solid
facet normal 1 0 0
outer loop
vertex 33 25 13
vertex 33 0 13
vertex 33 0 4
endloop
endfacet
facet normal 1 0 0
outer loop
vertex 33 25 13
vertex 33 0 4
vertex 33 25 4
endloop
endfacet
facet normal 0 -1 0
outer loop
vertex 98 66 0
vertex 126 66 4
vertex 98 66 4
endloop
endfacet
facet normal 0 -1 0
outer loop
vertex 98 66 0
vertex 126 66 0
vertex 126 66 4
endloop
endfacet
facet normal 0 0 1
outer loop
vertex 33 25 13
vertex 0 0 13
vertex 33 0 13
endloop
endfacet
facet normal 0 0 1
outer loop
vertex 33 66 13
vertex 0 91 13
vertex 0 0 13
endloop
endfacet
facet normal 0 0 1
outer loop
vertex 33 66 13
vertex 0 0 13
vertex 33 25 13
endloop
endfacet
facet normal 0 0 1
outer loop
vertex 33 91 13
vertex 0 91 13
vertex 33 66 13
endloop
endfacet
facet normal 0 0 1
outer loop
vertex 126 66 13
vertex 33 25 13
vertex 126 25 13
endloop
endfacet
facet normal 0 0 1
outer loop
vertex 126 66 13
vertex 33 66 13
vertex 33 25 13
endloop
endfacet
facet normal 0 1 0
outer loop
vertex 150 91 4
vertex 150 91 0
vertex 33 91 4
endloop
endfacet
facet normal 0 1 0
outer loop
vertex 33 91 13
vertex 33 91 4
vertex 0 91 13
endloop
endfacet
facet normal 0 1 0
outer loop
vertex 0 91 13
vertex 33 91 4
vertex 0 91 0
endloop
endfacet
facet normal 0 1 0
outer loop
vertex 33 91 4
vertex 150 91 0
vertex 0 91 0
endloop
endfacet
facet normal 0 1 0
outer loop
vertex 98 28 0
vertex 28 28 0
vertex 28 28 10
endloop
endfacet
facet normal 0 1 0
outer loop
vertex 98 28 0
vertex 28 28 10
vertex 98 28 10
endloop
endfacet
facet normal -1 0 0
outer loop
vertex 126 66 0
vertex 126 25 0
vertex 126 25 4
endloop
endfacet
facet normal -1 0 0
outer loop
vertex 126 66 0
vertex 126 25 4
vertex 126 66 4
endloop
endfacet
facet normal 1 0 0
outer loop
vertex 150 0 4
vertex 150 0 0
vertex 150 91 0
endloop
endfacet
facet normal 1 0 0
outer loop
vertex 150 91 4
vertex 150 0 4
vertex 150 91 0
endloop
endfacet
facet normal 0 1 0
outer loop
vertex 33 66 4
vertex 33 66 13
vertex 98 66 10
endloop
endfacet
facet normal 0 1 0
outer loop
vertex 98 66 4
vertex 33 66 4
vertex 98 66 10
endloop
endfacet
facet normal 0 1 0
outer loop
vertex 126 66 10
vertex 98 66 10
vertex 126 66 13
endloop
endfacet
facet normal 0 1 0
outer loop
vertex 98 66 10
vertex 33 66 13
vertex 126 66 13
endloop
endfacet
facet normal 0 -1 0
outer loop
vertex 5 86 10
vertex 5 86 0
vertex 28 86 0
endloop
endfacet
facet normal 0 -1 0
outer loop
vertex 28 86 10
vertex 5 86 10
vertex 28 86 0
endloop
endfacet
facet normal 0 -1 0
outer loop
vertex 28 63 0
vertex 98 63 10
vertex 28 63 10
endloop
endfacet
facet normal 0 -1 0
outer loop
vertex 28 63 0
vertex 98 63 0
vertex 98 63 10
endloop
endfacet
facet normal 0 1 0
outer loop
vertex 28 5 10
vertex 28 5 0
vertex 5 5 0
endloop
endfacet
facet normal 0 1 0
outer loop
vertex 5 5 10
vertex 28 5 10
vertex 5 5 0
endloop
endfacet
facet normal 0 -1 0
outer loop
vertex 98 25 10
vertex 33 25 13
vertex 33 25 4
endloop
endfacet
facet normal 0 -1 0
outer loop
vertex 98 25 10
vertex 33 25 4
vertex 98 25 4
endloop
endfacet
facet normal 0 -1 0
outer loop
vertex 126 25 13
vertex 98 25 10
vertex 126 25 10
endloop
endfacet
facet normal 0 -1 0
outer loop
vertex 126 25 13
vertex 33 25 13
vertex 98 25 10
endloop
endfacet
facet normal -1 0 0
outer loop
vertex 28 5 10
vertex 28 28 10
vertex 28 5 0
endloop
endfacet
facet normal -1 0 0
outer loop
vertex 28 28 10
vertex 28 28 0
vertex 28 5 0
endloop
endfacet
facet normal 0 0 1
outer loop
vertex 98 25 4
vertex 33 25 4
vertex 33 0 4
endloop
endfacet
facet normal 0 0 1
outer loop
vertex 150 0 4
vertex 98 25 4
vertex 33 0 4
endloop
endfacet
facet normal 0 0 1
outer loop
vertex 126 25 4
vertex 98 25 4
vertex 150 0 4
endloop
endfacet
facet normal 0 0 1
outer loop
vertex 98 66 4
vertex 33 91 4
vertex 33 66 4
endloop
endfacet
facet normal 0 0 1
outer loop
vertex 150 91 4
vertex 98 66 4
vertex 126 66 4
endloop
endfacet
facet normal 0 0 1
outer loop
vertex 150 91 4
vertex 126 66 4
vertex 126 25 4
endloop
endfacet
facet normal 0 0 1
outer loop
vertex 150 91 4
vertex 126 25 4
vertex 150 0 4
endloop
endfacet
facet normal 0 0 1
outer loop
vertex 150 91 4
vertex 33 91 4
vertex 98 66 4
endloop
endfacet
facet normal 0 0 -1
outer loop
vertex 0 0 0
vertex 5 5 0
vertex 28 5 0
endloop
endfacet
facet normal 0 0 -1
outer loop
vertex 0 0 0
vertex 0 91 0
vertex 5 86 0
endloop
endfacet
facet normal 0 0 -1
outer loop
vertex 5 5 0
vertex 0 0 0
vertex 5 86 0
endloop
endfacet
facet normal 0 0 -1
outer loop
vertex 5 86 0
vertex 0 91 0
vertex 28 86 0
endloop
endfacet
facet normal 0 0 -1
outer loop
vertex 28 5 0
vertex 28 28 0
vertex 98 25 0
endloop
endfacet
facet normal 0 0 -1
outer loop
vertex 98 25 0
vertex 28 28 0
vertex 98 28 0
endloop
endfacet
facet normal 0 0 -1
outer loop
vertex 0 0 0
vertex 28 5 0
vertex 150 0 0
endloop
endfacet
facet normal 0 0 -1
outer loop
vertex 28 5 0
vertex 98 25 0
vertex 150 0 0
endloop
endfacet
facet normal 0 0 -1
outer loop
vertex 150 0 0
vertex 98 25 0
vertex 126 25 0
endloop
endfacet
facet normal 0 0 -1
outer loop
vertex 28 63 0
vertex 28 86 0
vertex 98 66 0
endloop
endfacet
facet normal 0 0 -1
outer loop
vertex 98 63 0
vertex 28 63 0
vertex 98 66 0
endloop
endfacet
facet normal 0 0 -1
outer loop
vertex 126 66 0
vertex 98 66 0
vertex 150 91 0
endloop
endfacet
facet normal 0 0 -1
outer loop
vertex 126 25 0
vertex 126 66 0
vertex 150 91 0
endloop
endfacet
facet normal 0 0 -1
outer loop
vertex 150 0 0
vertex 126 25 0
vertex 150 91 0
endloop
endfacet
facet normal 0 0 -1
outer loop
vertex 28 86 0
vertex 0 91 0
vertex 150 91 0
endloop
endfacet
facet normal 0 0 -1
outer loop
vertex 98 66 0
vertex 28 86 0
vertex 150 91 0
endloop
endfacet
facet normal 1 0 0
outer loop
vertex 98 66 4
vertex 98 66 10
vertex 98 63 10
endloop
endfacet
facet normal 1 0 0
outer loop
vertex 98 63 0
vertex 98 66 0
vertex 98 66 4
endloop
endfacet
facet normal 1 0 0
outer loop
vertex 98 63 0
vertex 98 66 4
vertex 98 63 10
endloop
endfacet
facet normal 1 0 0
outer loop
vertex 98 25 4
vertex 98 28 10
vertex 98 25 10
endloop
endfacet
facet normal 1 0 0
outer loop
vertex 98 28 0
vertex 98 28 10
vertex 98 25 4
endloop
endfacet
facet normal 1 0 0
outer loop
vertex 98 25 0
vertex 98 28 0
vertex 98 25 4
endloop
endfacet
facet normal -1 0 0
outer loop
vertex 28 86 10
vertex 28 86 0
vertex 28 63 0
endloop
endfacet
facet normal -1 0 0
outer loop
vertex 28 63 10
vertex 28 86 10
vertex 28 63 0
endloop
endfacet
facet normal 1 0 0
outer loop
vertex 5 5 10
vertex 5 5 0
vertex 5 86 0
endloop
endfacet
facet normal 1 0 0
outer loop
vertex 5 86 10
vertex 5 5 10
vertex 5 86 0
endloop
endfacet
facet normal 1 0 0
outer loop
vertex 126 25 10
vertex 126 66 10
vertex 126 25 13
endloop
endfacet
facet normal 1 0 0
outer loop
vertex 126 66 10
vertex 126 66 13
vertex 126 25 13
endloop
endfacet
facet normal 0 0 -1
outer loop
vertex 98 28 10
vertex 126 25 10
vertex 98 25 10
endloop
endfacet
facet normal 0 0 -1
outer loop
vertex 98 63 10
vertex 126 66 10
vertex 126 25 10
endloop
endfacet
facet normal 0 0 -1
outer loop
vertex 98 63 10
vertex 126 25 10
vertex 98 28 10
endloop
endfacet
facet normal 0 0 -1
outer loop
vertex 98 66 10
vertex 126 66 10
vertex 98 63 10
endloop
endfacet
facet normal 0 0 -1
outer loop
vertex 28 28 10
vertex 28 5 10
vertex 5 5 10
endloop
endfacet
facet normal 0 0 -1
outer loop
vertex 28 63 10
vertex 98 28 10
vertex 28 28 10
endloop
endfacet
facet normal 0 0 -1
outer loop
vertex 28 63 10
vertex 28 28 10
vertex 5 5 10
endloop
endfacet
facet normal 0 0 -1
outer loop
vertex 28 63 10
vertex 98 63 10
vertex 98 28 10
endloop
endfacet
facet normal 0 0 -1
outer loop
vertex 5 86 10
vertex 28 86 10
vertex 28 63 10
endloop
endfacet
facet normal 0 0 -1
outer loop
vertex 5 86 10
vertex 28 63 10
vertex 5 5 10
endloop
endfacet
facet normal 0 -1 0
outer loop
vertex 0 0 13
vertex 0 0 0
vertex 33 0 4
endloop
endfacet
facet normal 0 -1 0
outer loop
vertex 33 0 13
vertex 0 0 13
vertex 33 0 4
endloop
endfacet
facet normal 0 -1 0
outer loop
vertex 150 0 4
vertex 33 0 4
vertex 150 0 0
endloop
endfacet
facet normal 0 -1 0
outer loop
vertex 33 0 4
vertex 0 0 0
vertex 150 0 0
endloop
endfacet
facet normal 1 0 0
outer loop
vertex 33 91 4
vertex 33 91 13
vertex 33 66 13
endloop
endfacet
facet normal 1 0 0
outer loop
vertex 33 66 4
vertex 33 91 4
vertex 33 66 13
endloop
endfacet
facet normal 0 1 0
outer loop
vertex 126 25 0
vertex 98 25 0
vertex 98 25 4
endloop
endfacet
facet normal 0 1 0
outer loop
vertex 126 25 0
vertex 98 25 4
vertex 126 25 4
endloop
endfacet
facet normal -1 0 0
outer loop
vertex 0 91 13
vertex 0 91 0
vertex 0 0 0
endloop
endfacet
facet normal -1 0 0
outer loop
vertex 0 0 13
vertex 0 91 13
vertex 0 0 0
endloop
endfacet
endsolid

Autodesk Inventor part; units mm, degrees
ref_plane "YZ Plane" through (0, 0, 0) normal (1, 0, 0) x (0, 1, 0)
ref_plane "XZ Plane" through (0, 0, 0) normal (0, 1, 0) x (-1, 0, 0)
ref_plane "XY Plane" through (0, 0, 0) normal (0, 0, 1) x (1, 0, 0)
sketch "Sketch1" plane through (0, 0, 0) normal (0, 0, 1) x (1, 0, 0)
  line L0 (0, 0) -> (150, 0)
  line L1 (150, 0) -> (150, 91)
  line L2 (150, 91) -> (0, 91)
  line L3 (0, 91) -> (0, 0)
  dimension "d0" = 150
  dimension "d1" = 91
extrude "Extrusion1" add sketch "Sketch1" along normal blind 13
sketch "Sketch2" plane through (0, 0, 13) normal (0, 0, 1) x (1, 0, 0)
  line L0 (150, 0) -> (150, 91) projected
  line L1 (150, 91) -> (33, 91)
  line L2 (33, 91) -> (33, 66)
  line L3 (33, 66) -> (150, 66)
  line L4 (150, 66) -> (150, 91)
  line L5 (0, 0) -> (150, 0) projected
  line L6 (150, 0) -> (33, 0)
  line L7 (33, 0) -> (33, 25)
  line L8 (33, 25) -> (150, 25)
  line L9 (150, 25) -> (150, 0)
  dimension "d4" = 25
  dimension "d5" = 25
  dimension "d6" = 117
  dimension "d7" = 117
extrude "Extrusion2" cut sketch "Sketch2" against normal blind 9
sketch "Sketch3" plane through (0, 0, 0) normal (0, 0, -1) x (-1, 0, 0)
  line L0 (-150, 66) -> (-33, 66) projected
  line L1 (-33, 25) -> (-150, 25) projected
  line L2 (-33, 66) -> (-33, 91) projected
  line L3 (0, 91) -> (0, 0) projected
  line L4 (-150, 91) -> (0, 91) projected
  line L5 (0, 0) -> (-150, 0) projected
  line L6 (-33, 0) -> (-33, 25) projected
  line L7 (-124, 63) -> (-5, 63)
  line L8 (-5, 63) -> (-5, 28)
  line L9 (-5, 28) -> (-124, 28)
  line L10 (-124, 28) -> (-124, 63)
  line L11 (-150, 0) -> (-150, 91) projected
  dimension "d10" = 3
  dimension "d11" = 3
  dimension "d12" = 5
  dimension "d16" = 26
extrude "Extrusion3" cut sketch "Sketch3" against normal blind 10 contours L7 L8 L9 L10
sketch "Sketch4" plane through (0, 0, 13) normal (0, 0, 1) x (1, 0, 0)
  line L0 (150, 66) -> (126, 66)
  line L1 (126, 66) -> (126, 25)
  line L2 (126, 25) -> (150, 25)
  line L3 (150, 25) -> (150, 66)
  line L4 (33, 25) -> (150, 25) projected
  line L5 (150, 66) -> (33, 66) projected
  line L6 (150, 25) -> (150, 66) projected
  point P0 (0, 0)
  dimension "d17" = 24
extrude "Extrusion4" cut sketch "Sketch4" against normal blind 9
sketch "Sketch5" plane through (0, 0, 0) normal (0, 0, -1) x (-1, 0, 0)
  line L0 (-126, 66) -> (-33, 66) projected
  line L1 (-33, 25) -> (-126, 25) projected
  line L2 (-126, 66) -> (-98, 66)
  line L3 (-98, 66) -> (-98, 25)
  line L4 (-98, 25) -> (-126, 25)
  line L5 (-126, 25) -> (-126, 66)
  line L6 (-126, 25) -> (-126, 66) projected
  point P0 (0, 0)
  dimension "d20" = 28
extrude "Extrusion5" cut sketch "Sketch5" against normal blind 10
sketch "Sketch6" plane through (0, 0, 0) normal (0, 0, -1) x (-1, 0, 0)
  line L0 (-28, 5) -> (-5, 5)
  line L1 (-5, 5) -> (-5, 86)
  line L2 (-5, 86) -> (-28, 86)
  line L3 (-28, 86) -> (-28, 5)
  line L4 (0, 0) -> (-150, 0) projected
  line L5 (-150, 91) -> (0, 91) projected
  line L6 (0, 91) -> (0, 0) projected
  line L7 (-33, 0) -> (-33, 25) projected
  line L8 (-33, 66) -> (-33, 91) projected
  dimension "d23" = 5
  dimension "d24" = 5
  dimension "d25" = 5
  dimension "d26" = 5
extrude "Extrusion6" cut sketch "Sketch6" against normal blind 10
equation "\"d11\" = d10"
equation "\"d25\" = d24"
properties part number "Base" material "Stainless Steel"
